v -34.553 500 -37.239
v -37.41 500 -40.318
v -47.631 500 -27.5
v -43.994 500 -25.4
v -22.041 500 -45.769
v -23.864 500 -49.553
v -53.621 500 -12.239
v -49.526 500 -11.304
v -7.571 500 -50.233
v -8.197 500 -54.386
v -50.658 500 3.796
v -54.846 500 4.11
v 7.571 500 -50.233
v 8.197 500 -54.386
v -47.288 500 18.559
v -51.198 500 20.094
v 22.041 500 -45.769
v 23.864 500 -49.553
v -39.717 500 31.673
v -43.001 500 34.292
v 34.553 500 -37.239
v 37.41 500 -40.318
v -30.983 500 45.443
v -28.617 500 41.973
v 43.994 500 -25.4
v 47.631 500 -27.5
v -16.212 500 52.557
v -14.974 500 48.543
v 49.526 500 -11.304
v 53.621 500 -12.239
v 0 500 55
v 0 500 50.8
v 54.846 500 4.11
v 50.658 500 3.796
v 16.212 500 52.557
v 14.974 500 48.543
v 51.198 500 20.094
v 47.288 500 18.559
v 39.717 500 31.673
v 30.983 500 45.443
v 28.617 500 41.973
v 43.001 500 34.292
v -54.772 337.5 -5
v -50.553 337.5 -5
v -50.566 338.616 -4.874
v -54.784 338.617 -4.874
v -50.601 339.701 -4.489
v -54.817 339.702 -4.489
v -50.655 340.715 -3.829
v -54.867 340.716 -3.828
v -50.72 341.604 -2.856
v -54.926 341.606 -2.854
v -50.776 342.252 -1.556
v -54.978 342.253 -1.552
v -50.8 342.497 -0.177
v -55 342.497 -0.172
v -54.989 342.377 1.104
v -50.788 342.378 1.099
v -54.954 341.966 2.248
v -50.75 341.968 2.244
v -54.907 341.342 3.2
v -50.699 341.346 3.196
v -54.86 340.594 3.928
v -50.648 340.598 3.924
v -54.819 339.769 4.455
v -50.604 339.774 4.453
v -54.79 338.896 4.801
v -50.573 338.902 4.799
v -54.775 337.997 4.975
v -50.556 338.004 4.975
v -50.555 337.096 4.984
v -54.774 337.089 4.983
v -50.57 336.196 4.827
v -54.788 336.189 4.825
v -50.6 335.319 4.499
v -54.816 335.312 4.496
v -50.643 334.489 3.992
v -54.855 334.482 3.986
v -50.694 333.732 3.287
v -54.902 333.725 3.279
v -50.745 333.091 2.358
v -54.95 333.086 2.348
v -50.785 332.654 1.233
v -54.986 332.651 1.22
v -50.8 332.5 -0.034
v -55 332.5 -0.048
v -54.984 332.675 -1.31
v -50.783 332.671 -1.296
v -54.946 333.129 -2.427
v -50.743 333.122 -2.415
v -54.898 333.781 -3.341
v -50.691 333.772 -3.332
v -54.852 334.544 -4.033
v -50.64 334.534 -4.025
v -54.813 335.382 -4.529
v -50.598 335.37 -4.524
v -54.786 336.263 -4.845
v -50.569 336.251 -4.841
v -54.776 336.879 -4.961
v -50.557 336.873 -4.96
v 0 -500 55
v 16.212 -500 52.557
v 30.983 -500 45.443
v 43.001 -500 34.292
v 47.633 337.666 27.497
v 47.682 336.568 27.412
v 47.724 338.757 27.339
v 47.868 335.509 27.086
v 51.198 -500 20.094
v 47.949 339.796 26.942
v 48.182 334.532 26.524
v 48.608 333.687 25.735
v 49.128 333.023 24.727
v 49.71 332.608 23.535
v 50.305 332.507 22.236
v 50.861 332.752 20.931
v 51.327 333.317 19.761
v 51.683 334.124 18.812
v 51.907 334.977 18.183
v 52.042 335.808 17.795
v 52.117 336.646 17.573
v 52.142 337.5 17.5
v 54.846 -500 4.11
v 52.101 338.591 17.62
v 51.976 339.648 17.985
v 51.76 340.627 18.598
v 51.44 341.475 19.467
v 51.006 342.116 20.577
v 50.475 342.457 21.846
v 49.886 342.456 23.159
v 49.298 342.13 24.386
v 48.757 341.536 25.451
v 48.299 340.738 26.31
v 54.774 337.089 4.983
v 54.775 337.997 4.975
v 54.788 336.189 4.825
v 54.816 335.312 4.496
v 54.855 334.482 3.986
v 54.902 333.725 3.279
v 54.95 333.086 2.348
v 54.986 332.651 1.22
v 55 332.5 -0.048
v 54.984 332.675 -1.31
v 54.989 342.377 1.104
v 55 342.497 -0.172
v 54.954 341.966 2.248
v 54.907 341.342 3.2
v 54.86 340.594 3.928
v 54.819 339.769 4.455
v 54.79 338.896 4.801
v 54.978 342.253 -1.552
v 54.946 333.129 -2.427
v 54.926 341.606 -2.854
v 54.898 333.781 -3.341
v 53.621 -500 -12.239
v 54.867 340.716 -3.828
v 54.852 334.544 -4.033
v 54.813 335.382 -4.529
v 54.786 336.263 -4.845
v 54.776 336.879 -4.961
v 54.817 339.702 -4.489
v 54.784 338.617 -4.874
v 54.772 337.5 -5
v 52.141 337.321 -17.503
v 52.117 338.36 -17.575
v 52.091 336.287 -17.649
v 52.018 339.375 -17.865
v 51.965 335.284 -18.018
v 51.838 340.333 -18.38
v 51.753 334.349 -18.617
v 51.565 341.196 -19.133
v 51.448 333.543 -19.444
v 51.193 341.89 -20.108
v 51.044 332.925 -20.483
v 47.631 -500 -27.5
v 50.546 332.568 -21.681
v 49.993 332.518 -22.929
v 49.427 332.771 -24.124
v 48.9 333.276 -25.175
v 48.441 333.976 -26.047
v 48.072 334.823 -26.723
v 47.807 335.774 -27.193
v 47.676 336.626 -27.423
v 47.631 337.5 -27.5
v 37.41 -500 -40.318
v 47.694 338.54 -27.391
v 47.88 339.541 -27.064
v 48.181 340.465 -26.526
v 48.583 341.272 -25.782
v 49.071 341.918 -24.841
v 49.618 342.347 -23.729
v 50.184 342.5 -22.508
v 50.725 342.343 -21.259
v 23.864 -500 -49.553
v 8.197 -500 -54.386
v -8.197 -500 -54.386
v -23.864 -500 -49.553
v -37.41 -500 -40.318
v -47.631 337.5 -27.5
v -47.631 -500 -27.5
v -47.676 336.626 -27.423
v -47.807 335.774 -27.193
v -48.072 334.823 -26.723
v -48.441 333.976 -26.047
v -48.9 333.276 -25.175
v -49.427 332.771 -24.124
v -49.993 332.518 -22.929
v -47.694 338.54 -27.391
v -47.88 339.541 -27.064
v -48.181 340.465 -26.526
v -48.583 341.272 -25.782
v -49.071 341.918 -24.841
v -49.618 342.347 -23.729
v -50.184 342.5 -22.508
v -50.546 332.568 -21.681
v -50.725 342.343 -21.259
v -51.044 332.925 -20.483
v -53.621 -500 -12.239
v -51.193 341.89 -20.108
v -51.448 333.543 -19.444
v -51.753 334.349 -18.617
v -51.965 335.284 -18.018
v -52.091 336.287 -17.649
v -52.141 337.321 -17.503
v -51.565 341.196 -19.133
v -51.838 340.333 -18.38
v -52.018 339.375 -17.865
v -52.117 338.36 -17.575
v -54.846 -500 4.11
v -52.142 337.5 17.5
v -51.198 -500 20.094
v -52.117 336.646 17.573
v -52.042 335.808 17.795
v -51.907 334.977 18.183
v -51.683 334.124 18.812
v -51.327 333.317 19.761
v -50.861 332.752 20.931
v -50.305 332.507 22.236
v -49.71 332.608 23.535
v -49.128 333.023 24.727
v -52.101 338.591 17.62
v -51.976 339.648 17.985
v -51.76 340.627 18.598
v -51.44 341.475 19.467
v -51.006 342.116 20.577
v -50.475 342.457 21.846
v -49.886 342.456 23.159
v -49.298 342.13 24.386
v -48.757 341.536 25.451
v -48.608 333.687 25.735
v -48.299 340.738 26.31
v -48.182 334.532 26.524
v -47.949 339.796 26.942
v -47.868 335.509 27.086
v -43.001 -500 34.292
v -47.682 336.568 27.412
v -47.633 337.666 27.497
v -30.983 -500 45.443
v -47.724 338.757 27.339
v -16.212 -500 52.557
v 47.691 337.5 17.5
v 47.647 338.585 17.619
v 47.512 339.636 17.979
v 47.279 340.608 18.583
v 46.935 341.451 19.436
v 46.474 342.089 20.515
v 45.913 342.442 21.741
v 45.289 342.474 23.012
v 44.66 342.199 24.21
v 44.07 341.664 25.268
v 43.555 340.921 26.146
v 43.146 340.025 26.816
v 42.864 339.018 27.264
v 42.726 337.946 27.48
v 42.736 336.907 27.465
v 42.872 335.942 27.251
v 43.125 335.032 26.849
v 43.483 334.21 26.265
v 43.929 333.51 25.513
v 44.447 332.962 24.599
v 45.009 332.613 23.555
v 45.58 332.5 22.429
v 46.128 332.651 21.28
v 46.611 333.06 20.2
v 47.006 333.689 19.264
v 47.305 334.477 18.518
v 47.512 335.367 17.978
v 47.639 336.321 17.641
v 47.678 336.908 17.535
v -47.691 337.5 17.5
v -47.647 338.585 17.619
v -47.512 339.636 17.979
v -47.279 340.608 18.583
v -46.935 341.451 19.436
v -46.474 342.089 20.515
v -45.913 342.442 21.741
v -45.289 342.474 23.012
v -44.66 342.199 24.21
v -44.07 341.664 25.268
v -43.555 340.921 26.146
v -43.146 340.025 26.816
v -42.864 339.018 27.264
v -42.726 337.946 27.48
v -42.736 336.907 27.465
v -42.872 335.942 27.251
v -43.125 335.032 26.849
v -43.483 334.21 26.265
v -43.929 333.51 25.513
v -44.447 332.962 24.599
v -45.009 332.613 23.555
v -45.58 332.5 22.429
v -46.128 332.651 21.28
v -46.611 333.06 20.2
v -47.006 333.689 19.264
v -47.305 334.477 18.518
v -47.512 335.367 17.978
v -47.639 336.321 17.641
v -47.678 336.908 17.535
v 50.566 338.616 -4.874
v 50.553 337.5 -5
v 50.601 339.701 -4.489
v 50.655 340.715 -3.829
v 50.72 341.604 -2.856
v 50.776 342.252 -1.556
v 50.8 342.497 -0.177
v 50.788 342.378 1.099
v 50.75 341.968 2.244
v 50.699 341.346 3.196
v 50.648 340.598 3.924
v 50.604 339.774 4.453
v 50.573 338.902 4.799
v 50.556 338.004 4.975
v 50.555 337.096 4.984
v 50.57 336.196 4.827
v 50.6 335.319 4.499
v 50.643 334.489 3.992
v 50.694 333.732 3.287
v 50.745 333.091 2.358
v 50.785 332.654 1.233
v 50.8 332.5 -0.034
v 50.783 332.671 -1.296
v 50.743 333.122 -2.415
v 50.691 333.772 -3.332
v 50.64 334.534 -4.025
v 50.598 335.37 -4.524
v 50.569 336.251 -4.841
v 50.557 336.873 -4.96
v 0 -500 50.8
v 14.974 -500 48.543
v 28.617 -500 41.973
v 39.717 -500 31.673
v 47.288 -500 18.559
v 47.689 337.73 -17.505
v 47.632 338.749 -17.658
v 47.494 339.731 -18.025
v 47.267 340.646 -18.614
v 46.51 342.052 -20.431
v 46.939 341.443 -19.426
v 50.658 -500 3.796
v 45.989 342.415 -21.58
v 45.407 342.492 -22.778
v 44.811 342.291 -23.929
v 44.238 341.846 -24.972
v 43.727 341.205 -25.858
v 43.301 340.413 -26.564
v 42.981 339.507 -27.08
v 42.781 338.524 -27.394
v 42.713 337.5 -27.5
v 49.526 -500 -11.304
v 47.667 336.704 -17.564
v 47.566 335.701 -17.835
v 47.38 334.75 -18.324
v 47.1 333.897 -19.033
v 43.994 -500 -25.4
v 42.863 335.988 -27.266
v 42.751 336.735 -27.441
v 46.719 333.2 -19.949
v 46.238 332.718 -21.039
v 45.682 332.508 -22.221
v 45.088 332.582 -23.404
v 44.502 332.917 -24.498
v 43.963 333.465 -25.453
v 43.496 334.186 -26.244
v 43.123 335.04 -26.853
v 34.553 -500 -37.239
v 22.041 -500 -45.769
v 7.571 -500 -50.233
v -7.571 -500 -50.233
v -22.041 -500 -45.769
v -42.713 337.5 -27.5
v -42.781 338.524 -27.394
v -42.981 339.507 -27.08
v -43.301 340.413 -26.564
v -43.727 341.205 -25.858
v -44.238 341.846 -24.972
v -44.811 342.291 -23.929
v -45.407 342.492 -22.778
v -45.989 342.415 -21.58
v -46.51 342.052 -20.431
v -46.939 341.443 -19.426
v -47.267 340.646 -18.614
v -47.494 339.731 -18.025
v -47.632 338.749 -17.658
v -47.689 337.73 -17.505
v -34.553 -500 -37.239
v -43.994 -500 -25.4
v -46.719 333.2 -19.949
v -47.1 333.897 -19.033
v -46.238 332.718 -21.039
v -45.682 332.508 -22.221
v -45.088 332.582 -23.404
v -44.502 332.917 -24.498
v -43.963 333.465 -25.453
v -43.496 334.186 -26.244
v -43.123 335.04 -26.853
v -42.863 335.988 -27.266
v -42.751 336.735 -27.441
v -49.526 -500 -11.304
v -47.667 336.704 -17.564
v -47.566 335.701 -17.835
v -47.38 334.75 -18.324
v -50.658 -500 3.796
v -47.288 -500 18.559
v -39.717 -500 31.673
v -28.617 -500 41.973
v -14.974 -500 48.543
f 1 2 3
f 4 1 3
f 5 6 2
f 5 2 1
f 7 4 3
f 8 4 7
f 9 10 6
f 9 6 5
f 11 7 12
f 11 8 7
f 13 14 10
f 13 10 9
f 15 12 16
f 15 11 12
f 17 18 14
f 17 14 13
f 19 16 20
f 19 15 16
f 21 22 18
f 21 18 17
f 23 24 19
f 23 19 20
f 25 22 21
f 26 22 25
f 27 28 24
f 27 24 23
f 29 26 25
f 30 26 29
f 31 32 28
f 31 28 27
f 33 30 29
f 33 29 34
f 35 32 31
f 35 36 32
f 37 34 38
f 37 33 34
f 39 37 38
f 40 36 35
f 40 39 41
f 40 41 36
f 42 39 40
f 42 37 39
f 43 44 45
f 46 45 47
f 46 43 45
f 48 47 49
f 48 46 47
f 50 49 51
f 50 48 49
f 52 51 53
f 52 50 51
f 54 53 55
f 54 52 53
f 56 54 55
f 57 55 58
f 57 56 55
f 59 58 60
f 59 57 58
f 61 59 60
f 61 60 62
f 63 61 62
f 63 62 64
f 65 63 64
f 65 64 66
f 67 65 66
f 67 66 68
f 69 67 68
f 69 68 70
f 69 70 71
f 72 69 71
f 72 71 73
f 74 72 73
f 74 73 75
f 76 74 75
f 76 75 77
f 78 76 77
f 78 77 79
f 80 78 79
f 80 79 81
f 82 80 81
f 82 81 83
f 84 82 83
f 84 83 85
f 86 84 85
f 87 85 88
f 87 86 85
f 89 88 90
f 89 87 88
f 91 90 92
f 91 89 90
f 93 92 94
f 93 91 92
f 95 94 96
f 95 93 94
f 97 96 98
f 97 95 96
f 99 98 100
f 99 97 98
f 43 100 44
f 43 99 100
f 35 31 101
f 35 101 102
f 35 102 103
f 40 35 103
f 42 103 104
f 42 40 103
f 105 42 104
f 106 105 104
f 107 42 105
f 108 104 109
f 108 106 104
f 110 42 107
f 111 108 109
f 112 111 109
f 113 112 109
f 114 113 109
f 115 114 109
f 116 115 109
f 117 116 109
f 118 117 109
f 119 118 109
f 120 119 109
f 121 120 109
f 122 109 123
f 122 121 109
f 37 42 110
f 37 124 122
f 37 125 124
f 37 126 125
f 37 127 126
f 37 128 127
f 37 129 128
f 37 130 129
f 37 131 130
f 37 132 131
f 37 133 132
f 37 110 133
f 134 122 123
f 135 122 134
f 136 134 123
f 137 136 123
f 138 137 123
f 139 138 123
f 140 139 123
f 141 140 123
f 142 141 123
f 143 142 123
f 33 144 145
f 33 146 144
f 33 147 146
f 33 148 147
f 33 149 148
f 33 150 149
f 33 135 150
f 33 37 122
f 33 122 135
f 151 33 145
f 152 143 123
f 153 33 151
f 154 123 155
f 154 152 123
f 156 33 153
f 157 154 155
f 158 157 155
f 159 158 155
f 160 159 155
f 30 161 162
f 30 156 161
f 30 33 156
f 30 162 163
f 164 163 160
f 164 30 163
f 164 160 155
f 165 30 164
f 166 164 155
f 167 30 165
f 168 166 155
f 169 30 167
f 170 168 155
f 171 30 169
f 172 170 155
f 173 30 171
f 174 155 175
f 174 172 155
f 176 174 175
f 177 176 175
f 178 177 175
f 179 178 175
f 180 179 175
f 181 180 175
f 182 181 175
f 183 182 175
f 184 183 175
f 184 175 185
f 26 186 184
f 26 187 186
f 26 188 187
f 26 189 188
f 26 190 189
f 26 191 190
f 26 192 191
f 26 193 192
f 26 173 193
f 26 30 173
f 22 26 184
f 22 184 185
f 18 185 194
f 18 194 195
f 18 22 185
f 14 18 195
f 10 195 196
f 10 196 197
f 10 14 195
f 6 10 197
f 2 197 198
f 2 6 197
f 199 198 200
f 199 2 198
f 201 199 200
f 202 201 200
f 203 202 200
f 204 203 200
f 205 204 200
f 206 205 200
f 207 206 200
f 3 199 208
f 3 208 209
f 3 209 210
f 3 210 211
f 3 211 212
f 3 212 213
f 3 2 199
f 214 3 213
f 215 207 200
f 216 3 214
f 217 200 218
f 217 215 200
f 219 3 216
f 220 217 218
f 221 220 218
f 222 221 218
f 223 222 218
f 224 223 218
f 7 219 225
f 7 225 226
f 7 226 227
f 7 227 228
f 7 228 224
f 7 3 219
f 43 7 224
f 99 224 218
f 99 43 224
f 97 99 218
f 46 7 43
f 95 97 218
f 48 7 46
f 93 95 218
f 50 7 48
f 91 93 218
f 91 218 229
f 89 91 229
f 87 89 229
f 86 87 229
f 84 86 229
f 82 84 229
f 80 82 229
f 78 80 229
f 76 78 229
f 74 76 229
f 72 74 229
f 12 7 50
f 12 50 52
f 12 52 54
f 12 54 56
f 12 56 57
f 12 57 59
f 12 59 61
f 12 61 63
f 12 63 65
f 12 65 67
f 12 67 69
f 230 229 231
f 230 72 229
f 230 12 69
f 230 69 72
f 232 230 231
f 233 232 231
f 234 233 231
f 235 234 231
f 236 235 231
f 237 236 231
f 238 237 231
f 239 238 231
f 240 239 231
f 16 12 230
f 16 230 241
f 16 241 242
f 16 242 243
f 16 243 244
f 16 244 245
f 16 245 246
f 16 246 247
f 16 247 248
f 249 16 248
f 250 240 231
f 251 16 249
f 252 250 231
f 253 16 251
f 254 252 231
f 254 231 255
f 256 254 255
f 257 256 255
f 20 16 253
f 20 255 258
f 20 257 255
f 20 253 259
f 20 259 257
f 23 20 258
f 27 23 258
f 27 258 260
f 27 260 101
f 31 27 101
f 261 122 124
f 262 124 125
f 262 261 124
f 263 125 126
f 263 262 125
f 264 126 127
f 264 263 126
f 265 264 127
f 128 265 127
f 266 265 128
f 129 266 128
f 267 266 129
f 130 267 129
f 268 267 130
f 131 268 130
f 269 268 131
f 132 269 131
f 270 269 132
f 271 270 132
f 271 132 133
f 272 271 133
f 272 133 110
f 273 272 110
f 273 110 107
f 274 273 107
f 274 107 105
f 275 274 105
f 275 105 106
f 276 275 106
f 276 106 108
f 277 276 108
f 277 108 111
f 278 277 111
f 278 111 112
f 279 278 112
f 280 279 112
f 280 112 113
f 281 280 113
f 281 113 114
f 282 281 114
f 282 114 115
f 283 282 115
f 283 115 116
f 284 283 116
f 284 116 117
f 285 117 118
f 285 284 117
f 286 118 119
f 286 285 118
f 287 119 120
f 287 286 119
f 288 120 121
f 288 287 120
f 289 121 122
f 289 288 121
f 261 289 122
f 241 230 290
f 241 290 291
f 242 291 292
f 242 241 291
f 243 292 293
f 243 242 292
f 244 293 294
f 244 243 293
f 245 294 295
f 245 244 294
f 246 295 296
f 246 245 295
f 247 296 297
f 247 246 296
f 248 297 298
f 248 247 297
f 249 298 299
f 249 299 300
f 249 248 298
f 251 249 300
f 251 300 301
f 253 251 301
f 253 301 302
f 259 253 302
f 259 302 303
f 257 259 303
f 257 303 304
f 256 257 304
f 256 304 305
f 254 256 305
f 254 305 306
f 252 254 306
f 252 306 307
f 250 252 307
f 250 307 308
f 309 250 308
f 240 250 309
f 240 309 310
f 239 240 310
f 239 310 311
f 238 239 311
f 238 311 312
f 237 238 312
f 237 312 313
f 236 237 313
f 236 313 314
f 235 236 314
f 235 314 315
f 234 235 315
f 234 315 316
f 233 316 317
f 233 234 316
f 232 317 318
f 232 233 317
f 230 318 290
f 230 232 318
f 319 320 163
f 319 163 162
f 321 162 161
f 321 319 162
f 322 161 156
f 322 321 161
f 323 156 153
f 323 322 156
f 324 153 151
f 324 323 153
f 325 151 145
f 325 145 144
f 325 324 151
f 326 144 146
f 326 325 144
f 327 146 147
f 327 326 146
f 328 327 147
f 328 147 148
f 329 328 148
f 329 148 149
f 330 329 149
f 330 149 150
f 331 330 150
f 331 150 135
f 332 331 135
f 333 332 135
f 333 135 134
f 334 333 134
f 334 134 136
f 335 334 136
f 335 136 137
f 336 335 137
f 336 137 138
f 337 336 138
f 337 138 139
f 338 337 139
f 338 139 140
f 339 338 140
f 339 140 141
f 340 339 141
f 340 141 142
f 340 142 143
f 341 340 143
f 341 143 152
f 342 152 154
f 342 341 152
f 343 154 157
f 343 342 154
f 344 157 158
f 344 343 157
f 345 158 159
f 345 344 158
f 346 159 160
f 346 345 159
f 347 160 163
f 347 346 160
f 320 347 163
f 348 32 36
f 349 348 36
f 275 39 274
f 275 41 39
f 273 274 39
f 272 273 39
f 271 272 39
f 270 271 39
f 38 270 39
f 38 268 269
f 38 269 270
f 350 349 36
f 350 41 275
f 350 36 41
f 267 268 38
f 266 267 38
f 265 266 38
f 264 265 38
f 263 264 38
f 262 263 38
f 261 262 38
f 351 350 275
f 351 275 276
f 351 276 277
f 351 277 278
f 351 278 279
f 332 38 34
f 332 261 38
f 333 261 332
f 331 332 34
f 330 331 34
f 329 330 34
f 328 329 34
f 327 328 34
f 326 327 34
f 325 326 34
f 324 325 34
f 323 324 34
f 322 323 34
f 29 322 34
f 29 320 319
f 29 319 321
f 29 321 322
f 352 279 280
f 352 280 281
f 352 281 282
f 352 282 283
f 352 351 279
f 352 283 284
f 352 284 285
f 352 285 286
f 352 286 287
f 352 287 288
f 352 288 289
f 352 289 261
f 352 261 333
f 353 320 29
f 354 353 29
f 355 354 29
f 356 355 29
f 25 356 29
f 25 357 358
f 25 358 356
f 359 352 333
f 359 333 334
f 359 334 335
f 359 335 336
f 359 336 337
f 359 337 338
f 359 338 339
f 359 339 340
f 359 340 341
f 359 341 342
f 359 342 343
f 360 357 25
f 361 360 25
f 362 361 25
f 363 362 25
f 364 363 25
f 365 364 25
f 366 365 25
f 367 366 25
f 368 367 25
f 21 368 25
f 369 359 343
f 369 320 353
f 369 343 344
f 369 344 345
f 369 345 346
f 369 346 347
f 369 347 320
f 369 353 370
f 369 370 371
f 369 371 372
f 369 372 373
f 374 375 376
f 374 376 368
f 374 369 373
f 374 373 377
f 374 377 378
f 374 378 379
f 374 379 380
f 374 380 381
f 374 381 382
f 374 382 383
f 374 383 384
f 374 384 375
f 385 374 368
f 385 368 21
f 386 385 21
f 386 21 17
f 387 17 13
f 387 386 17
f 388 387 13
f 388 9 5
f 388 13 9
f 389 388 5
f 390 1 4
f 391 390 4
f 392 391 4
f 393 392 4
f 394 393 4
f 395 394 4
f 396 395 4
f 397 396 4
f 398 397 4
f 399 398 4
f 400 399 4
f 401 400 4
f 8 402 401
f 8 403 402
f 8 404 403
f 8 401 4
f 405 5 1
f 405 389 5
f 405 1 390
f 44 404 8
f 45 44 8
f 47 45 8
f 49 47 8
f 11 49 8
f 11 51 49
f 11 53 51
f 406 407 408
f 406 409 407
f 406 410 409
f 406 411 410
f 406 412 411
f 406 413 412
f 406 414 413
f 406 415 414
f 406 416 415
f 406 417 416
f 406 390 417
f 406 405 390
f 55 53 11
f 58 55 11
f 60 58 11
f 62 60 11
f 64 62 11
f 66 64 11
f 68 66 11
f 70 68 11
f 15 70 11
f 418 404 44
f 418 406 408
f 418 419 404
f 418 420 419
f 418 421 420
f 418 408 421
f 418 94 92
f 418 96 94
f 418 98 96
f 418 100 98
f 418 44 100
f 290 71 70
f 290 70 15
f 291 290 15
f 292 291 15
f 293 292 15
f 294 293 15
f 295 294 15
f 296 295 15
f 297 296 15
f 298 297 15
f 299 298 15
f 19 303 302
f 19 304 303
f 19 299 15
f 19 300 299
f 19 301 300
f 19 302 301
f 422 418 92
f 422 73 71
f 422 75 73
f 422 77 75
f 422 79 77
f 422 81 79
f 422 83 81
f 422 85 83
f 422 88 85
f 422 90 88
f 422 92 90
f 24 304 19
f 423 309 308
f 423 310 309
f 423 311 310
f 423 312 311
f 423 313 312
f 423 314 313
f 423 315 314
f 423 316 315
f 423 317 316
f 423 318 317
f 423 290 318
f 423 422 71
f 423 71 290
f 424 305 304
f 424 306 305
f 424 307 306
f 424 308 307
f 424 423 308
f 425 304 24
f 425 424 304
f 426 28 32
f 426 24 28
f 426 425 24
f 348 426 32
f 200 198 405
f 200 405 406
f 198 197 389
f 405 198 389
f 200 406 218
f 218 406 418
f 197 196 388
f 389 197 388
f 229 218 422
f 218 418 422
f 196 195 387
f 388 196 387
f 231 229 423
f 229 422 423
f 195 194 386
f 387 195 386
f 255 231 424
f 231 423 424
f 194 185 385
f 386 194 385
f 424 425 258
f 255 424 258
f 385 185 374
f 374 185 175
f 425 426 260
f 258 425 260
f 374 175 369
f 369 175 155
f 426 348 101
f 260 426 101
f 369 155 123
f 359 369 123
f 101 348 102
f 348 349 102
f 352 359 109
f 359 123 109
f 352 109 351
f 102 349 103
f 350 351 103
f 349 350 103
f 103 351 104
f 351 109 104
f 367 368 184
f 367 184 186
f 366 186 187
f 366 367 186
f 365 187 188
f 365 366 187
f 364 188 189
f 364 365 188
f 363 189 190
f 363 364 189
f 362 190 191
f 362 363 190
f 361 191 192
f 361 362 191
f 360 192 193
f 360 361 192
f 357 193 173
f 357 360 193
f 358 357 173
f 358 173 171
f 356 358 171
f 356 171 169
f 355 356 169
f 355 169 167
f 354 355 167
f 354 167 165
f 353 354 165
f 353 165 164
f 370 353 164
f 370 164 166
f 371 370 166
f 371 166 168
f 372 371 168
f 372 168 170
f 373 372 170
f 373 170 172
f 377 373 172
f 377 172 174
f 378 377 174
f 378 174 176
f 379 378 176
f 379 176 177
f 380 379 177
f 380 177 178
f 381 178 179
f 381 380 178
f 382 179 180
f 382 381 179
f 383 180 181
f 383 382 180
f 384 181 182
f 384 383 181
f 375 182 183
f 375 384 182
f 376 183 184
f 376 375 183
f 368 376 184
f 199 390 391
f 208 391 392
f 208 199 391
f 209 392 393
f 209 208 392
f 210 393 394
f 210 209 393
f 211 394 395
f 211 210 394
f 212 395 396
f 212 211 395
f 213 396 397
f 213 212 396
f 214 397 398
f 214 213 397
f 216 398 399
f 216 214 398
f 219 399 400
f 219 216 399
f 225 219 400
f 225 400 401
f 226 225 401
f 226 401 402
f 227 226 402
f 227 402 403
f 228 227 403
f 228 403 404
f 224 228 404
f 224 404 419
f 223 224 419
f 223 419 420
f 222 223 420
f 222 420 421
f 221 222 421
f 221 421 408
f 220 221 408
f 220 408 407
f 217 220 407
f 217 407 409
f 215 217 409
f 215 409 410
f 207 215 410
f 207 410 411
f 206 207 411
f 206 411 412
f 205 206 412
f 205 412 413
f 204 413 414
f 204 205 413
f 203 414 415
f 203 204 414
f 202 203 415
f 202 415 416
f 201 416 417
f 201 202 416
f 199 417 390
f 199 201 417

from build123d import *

# Parameters (mm, degrees)
SKETCH1_R               = 55
SKETCH1_R_2             = 48.6
BOSS_EXTRUDE1_DEPTH     = 500
CUT_EXTRUDE1_DEPTH      = 507.013833803
CUT_EXTRUDE1_DEPTH_BACK = 507.013833803
SKETCH3_R               = 5
CUT_EXTRUDE2_DEPTH      = 1004.020438586
CUT_EXTRUDE2_DEPTH_BACK = 1004.020438586
SKETCH4_R               = 50.8


with BuildPart() as part:
    # Sketch1 → Boss-Extrude1 (new, symmetric)
    with BuildSketch(Plane(origin=(0, 0, 0), x_dir=(1, 0, 0), z_dir=(0, 1, 0))):
        with Locations(Location((0, 0, 0), (0, 0, 270))):
            Circle(SKETCH1_R)
        with Locations(Location((0, 0, 0), (0, 0, 270))):
            Circle(SKETCH1_R_2, mode=Mode.SUBTRACT)
    extrude(amount=BOSS_EXTRUDE1_DEPTH, both=True)

    # Sketch3 → Cut-Extrude1 (cut, two sides: drawn at the far end of the back side and taken through both)
    with BuildSketch(Plane(origin=(0, 0, 0), x_dir=(0, 0, -1), z_dir=(1, 0, 0)).offset(-CUT_EXTRUDE1_DEPTH_BACK)):
        with Locations((0, 337.5)):
            Circle(SKETCH3_R)
        with Locations((22.5, 337.5)):
            Circle(SKETCH3_R)
        with Locations((-22.5, 337.5)):
            Circle(SKETCH3_R)
    extrude(amount=CUT_EXTRUDE1_DEPTH + CUT_EXTRUDE1_DEPTH_BACK, mode=Mode.SUBTRACT)

    # Sketch4 → Cut-Extrude2 (cut, two sides: drawn at the far end of the back side and taken through both)
    with BuildSketch(Plane(origin=(0, 500, 0), x_dir=(1, 0, 0), z_dir=(0, 1, 0)).offset(-CUT_EXTRUDE2_DEPTH_BACK)):
        with Locations(Location((0, 0, 0), (0, 0, 270))):
            Circle(SKETCH4_R)
    extrude(amount=CUT_EXTRUDE2_DEPTH + CUT_EXTRUDE2_DEPTH_BACK, mode=Mode.SUBTRACT)


solid = part.part
